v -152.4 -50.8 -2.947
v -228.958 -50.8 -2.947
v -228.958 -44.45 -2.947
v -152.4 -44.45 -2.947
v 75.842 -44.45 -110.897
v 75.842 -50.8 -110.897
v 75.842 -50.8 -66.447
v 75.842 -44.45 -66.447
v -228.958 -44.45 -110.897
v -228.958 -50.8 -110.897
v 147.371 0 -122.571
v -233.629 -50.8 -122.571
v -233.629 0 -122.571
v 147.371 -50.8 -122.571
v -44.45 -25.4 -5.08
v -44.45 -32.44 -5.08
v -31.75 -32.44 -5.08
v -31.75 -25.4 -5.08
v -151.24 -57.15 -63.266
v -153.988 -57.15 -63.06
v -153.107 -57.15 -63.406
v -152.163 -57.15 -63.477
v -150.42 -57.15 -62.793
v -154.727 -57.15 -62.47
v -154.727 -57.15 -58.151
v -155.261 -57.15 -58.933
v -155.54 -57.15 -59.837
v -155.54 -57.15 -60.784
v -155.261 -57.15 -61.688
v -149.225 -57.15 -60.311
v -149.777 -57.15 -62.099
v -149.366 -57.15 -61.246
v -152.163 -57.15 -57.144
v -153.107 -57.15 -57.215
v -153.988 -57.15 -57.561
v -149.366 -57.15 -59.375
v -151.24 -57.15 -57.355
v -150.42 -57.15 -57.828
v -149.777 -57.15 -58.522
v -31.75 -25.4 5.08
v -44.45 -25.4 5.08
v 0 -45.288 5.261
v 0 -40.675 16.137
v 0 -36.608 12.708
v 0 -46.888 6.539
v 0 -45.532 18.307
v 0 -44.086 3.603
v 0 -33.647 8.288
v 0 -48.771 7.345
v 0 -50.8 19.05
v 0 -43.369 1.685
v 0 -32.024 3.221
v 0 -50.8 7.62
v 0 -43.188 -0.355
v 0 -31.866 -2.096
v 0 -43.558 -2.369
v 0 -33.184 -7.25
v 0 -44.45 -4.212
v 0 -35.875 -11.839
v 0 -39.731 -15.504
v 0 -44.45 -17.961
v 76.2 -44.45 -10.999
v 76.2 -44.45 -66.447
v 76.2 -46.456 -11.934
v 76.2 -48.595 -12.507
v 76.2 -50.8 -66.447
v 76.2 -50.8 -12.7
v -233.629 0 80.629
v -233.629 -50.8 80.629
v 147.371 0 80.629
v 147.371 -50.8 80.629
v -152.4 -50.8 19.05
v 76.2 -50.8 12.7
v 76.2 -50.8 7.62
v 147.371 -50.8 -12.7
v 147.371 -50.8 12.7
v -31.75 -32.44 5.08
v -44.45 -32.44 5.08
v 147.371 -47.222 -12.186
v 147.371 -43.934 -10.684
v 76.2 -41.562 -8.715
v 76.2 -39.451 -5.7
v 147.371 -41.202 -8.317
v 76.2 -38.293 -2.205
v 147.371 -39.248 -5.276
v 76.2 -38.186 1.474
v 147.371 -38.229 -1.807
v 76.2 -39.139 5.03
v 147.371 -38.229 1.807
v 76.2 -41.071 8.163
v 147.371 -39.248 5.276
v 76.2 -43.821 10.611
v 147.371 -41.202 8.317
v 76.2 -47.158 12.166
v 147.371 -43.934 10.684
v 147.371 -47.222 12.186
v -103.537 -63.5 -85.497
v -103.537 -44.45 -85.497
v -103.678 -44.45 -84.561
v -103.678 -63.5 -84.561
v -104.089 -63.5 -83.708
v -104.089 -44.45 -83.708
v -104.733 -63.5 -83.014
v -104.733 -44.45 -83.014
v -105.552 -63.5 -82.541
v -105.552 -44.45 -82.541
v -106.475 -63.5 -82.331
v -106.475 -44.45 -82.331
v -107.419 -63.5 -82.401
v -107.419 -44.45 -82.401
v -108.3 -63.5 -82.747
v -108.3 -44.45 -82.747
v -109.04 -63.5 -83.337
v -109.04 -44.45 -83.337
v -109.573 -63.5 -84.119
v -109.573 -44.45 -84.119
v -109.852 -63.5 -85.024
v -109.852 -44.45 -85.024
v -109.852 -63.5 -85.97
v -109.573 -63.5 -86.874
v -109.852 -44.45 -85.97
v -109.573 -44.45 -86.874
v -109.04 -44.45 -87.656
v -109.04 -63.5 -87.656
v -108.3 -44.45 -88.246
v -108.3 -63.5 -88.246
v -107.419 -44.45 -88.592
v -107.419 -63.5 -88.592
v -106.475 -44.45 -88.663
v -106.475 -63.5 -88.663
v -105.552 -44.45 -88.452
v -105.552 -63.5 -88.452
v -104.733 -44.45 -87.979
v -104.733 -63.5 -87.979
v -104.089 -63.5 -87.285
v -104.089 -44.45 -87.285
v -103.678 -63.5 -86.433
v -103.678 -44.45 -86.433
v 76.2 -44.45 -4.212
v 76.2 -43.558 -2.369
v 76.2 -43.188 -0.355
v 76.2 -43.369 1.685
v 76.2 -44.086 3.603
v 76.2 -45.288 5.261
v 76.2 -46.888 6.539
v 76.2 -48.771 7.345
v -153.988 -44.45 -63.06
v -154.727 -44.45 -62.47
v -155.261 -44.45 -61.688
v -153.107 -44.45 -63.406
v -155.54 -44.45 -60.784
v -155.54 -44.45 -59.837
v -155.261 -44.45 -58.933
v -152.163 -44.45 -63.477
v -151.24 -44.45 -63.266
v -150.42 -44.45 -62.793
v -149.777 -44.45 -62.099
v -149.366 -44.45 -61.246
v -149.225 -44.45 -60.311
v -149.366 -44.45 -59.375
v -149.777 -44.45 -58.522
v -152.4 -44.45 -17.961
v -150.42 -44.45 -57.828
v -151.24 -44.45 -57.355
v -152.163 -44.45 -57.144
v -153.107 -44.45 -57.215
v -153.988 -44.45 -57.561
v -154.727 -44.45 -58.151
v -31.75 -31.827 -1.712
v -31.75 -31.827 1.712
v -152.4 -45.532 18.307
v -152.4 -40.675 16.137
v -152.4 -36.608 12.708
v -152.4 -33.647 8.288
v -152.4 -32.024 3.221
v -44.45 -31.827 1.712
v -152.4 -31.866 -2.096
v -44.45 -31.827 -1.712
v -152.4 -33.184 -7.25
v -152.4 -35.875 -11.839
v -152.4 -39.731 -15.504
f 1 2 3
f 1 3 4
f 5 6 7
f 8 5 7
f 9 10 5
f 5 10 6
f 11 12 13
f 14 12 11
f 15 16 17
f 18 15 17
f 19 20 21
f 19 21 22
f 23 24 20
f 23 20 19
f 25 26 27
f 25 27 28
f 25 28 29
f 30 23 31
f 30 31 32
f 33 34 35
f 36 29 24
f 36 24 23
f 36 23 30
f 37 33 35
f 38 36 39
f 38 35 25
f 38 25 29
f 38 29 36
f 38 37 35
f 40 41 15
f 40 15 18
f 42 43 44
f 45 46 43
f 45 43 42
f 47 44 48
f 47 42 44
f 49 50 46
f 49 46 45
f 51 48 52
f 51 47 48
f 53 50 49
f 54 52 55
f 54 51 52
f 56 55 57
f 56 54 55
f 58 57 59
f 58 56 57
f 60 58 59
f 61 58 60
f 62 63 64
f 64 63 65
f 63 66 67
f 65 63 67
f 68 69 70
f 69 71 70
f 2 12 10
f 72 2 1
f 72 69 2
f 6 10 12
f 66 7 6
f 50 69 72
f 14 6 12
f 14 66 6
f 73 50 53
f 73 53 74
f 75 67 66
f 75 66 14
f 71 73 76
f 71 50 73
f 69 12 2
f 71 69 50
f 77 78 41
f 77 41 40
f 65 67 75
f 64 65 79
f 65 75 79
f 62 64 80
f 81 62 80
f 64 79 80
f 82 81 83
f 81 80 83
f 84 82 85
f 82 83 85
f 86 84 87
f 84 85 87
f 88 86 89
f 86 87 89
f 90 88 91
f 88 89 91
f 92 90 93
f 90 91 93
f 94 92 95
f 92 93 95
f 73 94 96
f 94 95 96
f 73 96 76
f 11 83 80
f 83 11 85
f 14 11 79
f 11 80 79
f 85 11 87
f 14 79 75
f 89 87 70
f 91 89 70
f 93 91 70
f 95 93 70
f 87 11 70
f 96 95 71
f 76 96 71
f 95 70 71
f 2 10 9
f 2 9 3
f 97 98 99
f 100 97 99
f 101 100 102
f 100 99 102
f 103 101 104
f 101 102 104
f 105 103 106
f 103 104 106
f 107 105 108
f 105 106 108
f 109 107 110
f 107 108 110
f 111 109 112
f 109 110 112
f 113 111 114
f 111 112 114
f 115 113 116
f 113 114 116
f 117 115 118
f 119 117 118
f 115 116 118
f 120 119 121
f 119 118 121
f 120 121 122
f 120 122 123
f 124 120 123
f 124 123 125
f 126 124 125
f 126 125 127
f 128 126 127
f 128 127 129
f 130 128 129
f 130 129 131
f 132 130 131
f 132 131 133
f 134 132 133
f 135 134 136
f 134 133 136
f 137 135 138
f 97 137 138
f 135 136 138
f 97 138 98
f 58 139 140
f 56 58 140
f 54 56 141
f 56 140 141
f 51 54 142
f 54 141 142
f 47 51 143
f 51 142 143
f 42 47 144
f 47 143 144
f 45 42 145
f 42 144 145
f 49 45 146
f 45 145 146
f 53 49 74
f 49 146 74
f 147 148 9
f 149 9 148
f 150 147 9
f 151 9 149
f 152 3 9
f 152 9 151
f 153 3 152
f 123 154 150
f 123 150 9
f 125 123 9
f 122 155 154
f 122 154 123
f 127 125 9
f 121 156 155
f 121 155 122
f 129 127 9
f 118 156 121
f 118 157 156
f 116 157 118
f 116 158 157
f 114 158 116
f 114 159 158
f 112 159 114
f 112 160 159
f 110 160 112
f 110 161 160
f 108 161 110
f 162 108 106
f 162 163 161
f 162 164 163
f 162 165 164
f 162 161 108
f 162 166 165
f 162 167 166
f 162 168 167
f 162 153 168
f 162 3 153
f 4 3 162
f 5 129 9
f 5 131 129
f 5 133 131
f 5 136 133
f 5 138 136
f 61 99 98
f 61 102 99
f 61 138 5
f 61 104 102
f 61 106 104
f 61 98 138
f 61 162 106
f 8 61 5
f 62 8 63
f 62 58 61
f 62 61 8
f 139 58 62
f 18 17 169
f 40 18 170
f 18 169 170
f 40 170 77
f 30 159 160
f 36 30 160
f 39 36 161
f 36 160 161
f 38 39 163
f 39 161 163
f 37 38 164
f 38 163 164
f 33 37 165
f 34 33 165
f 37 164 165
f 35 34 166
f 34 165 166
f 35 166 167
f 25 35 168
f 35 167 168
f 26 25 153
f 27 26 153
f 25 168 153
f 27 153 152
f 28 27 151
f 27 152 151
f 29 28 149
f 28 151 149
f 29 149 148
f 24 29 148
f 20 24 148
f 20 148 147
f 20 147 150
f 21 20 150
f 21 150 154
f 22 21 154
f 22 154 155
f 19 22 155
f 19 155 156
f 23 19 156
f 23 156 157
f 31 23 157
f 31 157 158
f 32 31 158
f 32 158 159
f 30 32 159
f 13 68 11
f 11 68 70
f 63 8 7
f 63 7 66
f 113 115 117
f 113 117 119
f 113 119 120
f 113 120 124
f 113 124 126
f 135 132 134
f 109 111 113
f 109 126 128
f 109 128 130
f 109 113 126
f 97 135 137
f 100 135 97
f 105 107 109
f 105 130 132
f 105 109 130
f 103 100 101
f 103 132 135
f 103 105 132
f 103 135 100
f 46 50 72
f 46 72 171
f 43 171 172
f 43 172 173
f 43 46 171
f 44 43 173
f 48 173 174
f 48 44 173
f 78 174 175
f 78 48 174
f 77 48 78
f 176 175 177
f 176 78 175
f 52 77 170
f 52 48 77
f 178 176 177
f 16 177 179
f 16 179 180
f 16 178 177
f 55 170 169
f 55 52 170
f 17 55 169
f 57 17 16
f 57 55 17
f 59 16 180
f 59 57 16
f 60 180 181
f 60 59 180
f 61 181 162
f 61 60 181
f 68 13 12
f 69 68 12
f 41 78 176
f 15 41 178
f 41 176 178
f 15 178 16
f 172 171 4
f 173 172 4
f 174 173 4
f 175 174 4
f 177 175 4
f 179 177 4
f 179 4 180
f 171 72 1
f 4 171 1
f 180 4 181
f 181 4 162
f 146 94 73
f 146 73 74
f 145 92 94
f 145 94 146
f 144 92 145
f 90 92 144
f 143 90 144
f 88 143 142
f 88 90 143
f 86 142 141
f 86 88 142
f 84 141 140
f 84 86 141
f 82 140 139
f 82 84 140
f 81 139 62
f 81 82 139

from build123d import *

# Parameters (mm, degrees)
F0_W      = 304.8
F0_H      = 152.4
F1_DEPTH  = 50.8
F2_W      = 152.4
F2_H      = 19.05
F4_W      = 12.7
F4_H      = 5.08
F5_DEPTH  = 25.4
F6_W      = 76.2
F6_H      = 7.62
F9_W      = 228.6
F9_H      = 63.5
F9_W_2    = 14.362933135
F10_DEPTH = 6.35
F8_W      = 6.35
F8_H      = 152.4
F8_W_2    = 44.45
F11_DEPTH = 76.2
F12_W     = 71.5284022924
F12_H     = 63.5
F13_DEPTH = 6.35
F14_R     = 3.175
F15_DEPTH = 12.7
F16_W     = 381
F16_H     = 50.8
F17_DEPTH = 50.8
F18_W     = 304.8
F18_H     = 44.45
F19_DEPTH = 6.35
F20_R     = 3.175
F21_DEPTH = 19.05
F22_W     = 71.1707984924
F22_H     = 12.7
F24_DEPTH = 6.35


with BuildPart() as f1:
    # F0 (on Front) → F1 (new body)
    with BuildSketch(Plane.XZ):
        with Locations((-5.0292015076, 4.4291064884)):
            Rectangle(F0_W, F0_H)
    extrude(amount=F1_DEPTH)

    # F2 (on face) → F3 (revolve, cut)
    with BuildSketch(Plane.XZ.offset(50.8)):
        with Locations((-76.2, -9.525)):
            Rectangle(F2_W, F2_H)
    revolve(axis=Axis((-76.2, -50.8, 0), (-1, 0, 0)), mode=Mode.SUBTRACT)

    # F4 (on face) → F5 (cut)
    with BuildSketch(Plane.XZ.offset(50.8)):
        with Locations((-38.1, 2.54)):
            Rectangle(F4_W, F4_H)
        with Locations((-38.1, -2.54)):
            Rectangle(F4_W, F4_H)
    extrude(amount=-F5_DEPTH, mode=Mode.SUBTRACT)

    # F6 (on face) → F7 (revolve, cut)
    with BuildSketch(Plane.XZ.offset(50.8)):
        with Locations((38.1, -3.81)):
            Rectangle(F6_W, F6_H)
    revolve(axis=Axis((38.1, -50.8, 0), (1, 0, 0)), mode=Mode.SUBTRACT)

    # F9 (on face) → F10 (cut)
    with BuildSketch(Plane.XZ.offset(50.8)):
        with Locations((-38.1, -34.6967290044)):
            Rectangle(F9_W, F9_H)
        with Locations((-159.5814665675, -34.6967290044)):
            Rectangle(F9_W_2, F9_H)
    extrude(amount=-F10_DEPTH, mode=Mode.SUBTRACT)

    # F8 (on face) → F11 (join)
    with BuildSketch(Plane(origin=(-157.4292015076, 0, 0), x_dir=(0, -1, 0), z_dir=(-1, 0, 0))):
        with Locations((47.625, 4.4291064884)):
            Rectangle(F8_W, F8_H)
        with Locations((22.225, 4.4291064884)):
            Rectangle(F8_W_2, F8_H)
    extrude(amount=F11_DEPTH)

    # F12 (on face) → F13 (cut)
    with BuildSketch(Plane.XZ.offset(50.8)):
        with Locations((-193.1934026538, -34.6967290044)):
            Rectangle(F12_W, F12_H)
    extrude(amount=-F13_DEPTH, mode=Mode.SUBTRACT)

    # F14 (on face) → F15 (join)
    with BuildSketch(Plane.XZ.offset(44.45)):
        with Locations((-152.4, -60.3105122421)):
            Circle(F14_R)
    extrude(amount=F15_DEPTH)

    # F16 (on face) → F17 (join)
    with BuildSketch(Plane(origin=(0, 0, -71.7708935116), x_dir=(1, 0, 0), z_dir=(0, 0, -1))):
        with Locations((-43.1292015076, 25.4)):
            Rectangle(F16_W, F16_H)
    extrude(amount=F17_DEPTH)

    # F18 (on face) → F19 (cut)
    with BuildSketch(Plane.XZ.offset(50.8)):
        with Locations((-76.5576038, -88.6717290044)):
            Rectangle(F18_W, F18_H)
    extrude(amount=-F19_DEPTH, mode=Mode.SUBTRACT)

    # F20 (on face) → F21 (join)
    with BuildSketch(Plane.XZ.offset(44.45)):
        with Locations((-106.7121654678, -85.4967290044)):
            Circle(F20_R)
    extrude(amount=F21_DEPTH)

    # F22 (on face) → F23 (revolve, cut)
    with BuildSketch(Plane.XZ.offset(50.8)):
        with Locations((111.7853992462, -6.35)):
            Rectangle(F22_W, F22_H)
    revolve(axis=Axis((111.7853992462, -50.8, 0), (1, 0, 0)), mode=Mode.SUBTRACT)

    # F14 (on face) → F24 (join)
    with BuildSketch(Plane.XZ.offset(44.45)):
        with Locations((-152.4, -60.3105122421)):
            Circle(F14_R)
    extrude(amount=F24_DEPTH)


solid = f1.part
